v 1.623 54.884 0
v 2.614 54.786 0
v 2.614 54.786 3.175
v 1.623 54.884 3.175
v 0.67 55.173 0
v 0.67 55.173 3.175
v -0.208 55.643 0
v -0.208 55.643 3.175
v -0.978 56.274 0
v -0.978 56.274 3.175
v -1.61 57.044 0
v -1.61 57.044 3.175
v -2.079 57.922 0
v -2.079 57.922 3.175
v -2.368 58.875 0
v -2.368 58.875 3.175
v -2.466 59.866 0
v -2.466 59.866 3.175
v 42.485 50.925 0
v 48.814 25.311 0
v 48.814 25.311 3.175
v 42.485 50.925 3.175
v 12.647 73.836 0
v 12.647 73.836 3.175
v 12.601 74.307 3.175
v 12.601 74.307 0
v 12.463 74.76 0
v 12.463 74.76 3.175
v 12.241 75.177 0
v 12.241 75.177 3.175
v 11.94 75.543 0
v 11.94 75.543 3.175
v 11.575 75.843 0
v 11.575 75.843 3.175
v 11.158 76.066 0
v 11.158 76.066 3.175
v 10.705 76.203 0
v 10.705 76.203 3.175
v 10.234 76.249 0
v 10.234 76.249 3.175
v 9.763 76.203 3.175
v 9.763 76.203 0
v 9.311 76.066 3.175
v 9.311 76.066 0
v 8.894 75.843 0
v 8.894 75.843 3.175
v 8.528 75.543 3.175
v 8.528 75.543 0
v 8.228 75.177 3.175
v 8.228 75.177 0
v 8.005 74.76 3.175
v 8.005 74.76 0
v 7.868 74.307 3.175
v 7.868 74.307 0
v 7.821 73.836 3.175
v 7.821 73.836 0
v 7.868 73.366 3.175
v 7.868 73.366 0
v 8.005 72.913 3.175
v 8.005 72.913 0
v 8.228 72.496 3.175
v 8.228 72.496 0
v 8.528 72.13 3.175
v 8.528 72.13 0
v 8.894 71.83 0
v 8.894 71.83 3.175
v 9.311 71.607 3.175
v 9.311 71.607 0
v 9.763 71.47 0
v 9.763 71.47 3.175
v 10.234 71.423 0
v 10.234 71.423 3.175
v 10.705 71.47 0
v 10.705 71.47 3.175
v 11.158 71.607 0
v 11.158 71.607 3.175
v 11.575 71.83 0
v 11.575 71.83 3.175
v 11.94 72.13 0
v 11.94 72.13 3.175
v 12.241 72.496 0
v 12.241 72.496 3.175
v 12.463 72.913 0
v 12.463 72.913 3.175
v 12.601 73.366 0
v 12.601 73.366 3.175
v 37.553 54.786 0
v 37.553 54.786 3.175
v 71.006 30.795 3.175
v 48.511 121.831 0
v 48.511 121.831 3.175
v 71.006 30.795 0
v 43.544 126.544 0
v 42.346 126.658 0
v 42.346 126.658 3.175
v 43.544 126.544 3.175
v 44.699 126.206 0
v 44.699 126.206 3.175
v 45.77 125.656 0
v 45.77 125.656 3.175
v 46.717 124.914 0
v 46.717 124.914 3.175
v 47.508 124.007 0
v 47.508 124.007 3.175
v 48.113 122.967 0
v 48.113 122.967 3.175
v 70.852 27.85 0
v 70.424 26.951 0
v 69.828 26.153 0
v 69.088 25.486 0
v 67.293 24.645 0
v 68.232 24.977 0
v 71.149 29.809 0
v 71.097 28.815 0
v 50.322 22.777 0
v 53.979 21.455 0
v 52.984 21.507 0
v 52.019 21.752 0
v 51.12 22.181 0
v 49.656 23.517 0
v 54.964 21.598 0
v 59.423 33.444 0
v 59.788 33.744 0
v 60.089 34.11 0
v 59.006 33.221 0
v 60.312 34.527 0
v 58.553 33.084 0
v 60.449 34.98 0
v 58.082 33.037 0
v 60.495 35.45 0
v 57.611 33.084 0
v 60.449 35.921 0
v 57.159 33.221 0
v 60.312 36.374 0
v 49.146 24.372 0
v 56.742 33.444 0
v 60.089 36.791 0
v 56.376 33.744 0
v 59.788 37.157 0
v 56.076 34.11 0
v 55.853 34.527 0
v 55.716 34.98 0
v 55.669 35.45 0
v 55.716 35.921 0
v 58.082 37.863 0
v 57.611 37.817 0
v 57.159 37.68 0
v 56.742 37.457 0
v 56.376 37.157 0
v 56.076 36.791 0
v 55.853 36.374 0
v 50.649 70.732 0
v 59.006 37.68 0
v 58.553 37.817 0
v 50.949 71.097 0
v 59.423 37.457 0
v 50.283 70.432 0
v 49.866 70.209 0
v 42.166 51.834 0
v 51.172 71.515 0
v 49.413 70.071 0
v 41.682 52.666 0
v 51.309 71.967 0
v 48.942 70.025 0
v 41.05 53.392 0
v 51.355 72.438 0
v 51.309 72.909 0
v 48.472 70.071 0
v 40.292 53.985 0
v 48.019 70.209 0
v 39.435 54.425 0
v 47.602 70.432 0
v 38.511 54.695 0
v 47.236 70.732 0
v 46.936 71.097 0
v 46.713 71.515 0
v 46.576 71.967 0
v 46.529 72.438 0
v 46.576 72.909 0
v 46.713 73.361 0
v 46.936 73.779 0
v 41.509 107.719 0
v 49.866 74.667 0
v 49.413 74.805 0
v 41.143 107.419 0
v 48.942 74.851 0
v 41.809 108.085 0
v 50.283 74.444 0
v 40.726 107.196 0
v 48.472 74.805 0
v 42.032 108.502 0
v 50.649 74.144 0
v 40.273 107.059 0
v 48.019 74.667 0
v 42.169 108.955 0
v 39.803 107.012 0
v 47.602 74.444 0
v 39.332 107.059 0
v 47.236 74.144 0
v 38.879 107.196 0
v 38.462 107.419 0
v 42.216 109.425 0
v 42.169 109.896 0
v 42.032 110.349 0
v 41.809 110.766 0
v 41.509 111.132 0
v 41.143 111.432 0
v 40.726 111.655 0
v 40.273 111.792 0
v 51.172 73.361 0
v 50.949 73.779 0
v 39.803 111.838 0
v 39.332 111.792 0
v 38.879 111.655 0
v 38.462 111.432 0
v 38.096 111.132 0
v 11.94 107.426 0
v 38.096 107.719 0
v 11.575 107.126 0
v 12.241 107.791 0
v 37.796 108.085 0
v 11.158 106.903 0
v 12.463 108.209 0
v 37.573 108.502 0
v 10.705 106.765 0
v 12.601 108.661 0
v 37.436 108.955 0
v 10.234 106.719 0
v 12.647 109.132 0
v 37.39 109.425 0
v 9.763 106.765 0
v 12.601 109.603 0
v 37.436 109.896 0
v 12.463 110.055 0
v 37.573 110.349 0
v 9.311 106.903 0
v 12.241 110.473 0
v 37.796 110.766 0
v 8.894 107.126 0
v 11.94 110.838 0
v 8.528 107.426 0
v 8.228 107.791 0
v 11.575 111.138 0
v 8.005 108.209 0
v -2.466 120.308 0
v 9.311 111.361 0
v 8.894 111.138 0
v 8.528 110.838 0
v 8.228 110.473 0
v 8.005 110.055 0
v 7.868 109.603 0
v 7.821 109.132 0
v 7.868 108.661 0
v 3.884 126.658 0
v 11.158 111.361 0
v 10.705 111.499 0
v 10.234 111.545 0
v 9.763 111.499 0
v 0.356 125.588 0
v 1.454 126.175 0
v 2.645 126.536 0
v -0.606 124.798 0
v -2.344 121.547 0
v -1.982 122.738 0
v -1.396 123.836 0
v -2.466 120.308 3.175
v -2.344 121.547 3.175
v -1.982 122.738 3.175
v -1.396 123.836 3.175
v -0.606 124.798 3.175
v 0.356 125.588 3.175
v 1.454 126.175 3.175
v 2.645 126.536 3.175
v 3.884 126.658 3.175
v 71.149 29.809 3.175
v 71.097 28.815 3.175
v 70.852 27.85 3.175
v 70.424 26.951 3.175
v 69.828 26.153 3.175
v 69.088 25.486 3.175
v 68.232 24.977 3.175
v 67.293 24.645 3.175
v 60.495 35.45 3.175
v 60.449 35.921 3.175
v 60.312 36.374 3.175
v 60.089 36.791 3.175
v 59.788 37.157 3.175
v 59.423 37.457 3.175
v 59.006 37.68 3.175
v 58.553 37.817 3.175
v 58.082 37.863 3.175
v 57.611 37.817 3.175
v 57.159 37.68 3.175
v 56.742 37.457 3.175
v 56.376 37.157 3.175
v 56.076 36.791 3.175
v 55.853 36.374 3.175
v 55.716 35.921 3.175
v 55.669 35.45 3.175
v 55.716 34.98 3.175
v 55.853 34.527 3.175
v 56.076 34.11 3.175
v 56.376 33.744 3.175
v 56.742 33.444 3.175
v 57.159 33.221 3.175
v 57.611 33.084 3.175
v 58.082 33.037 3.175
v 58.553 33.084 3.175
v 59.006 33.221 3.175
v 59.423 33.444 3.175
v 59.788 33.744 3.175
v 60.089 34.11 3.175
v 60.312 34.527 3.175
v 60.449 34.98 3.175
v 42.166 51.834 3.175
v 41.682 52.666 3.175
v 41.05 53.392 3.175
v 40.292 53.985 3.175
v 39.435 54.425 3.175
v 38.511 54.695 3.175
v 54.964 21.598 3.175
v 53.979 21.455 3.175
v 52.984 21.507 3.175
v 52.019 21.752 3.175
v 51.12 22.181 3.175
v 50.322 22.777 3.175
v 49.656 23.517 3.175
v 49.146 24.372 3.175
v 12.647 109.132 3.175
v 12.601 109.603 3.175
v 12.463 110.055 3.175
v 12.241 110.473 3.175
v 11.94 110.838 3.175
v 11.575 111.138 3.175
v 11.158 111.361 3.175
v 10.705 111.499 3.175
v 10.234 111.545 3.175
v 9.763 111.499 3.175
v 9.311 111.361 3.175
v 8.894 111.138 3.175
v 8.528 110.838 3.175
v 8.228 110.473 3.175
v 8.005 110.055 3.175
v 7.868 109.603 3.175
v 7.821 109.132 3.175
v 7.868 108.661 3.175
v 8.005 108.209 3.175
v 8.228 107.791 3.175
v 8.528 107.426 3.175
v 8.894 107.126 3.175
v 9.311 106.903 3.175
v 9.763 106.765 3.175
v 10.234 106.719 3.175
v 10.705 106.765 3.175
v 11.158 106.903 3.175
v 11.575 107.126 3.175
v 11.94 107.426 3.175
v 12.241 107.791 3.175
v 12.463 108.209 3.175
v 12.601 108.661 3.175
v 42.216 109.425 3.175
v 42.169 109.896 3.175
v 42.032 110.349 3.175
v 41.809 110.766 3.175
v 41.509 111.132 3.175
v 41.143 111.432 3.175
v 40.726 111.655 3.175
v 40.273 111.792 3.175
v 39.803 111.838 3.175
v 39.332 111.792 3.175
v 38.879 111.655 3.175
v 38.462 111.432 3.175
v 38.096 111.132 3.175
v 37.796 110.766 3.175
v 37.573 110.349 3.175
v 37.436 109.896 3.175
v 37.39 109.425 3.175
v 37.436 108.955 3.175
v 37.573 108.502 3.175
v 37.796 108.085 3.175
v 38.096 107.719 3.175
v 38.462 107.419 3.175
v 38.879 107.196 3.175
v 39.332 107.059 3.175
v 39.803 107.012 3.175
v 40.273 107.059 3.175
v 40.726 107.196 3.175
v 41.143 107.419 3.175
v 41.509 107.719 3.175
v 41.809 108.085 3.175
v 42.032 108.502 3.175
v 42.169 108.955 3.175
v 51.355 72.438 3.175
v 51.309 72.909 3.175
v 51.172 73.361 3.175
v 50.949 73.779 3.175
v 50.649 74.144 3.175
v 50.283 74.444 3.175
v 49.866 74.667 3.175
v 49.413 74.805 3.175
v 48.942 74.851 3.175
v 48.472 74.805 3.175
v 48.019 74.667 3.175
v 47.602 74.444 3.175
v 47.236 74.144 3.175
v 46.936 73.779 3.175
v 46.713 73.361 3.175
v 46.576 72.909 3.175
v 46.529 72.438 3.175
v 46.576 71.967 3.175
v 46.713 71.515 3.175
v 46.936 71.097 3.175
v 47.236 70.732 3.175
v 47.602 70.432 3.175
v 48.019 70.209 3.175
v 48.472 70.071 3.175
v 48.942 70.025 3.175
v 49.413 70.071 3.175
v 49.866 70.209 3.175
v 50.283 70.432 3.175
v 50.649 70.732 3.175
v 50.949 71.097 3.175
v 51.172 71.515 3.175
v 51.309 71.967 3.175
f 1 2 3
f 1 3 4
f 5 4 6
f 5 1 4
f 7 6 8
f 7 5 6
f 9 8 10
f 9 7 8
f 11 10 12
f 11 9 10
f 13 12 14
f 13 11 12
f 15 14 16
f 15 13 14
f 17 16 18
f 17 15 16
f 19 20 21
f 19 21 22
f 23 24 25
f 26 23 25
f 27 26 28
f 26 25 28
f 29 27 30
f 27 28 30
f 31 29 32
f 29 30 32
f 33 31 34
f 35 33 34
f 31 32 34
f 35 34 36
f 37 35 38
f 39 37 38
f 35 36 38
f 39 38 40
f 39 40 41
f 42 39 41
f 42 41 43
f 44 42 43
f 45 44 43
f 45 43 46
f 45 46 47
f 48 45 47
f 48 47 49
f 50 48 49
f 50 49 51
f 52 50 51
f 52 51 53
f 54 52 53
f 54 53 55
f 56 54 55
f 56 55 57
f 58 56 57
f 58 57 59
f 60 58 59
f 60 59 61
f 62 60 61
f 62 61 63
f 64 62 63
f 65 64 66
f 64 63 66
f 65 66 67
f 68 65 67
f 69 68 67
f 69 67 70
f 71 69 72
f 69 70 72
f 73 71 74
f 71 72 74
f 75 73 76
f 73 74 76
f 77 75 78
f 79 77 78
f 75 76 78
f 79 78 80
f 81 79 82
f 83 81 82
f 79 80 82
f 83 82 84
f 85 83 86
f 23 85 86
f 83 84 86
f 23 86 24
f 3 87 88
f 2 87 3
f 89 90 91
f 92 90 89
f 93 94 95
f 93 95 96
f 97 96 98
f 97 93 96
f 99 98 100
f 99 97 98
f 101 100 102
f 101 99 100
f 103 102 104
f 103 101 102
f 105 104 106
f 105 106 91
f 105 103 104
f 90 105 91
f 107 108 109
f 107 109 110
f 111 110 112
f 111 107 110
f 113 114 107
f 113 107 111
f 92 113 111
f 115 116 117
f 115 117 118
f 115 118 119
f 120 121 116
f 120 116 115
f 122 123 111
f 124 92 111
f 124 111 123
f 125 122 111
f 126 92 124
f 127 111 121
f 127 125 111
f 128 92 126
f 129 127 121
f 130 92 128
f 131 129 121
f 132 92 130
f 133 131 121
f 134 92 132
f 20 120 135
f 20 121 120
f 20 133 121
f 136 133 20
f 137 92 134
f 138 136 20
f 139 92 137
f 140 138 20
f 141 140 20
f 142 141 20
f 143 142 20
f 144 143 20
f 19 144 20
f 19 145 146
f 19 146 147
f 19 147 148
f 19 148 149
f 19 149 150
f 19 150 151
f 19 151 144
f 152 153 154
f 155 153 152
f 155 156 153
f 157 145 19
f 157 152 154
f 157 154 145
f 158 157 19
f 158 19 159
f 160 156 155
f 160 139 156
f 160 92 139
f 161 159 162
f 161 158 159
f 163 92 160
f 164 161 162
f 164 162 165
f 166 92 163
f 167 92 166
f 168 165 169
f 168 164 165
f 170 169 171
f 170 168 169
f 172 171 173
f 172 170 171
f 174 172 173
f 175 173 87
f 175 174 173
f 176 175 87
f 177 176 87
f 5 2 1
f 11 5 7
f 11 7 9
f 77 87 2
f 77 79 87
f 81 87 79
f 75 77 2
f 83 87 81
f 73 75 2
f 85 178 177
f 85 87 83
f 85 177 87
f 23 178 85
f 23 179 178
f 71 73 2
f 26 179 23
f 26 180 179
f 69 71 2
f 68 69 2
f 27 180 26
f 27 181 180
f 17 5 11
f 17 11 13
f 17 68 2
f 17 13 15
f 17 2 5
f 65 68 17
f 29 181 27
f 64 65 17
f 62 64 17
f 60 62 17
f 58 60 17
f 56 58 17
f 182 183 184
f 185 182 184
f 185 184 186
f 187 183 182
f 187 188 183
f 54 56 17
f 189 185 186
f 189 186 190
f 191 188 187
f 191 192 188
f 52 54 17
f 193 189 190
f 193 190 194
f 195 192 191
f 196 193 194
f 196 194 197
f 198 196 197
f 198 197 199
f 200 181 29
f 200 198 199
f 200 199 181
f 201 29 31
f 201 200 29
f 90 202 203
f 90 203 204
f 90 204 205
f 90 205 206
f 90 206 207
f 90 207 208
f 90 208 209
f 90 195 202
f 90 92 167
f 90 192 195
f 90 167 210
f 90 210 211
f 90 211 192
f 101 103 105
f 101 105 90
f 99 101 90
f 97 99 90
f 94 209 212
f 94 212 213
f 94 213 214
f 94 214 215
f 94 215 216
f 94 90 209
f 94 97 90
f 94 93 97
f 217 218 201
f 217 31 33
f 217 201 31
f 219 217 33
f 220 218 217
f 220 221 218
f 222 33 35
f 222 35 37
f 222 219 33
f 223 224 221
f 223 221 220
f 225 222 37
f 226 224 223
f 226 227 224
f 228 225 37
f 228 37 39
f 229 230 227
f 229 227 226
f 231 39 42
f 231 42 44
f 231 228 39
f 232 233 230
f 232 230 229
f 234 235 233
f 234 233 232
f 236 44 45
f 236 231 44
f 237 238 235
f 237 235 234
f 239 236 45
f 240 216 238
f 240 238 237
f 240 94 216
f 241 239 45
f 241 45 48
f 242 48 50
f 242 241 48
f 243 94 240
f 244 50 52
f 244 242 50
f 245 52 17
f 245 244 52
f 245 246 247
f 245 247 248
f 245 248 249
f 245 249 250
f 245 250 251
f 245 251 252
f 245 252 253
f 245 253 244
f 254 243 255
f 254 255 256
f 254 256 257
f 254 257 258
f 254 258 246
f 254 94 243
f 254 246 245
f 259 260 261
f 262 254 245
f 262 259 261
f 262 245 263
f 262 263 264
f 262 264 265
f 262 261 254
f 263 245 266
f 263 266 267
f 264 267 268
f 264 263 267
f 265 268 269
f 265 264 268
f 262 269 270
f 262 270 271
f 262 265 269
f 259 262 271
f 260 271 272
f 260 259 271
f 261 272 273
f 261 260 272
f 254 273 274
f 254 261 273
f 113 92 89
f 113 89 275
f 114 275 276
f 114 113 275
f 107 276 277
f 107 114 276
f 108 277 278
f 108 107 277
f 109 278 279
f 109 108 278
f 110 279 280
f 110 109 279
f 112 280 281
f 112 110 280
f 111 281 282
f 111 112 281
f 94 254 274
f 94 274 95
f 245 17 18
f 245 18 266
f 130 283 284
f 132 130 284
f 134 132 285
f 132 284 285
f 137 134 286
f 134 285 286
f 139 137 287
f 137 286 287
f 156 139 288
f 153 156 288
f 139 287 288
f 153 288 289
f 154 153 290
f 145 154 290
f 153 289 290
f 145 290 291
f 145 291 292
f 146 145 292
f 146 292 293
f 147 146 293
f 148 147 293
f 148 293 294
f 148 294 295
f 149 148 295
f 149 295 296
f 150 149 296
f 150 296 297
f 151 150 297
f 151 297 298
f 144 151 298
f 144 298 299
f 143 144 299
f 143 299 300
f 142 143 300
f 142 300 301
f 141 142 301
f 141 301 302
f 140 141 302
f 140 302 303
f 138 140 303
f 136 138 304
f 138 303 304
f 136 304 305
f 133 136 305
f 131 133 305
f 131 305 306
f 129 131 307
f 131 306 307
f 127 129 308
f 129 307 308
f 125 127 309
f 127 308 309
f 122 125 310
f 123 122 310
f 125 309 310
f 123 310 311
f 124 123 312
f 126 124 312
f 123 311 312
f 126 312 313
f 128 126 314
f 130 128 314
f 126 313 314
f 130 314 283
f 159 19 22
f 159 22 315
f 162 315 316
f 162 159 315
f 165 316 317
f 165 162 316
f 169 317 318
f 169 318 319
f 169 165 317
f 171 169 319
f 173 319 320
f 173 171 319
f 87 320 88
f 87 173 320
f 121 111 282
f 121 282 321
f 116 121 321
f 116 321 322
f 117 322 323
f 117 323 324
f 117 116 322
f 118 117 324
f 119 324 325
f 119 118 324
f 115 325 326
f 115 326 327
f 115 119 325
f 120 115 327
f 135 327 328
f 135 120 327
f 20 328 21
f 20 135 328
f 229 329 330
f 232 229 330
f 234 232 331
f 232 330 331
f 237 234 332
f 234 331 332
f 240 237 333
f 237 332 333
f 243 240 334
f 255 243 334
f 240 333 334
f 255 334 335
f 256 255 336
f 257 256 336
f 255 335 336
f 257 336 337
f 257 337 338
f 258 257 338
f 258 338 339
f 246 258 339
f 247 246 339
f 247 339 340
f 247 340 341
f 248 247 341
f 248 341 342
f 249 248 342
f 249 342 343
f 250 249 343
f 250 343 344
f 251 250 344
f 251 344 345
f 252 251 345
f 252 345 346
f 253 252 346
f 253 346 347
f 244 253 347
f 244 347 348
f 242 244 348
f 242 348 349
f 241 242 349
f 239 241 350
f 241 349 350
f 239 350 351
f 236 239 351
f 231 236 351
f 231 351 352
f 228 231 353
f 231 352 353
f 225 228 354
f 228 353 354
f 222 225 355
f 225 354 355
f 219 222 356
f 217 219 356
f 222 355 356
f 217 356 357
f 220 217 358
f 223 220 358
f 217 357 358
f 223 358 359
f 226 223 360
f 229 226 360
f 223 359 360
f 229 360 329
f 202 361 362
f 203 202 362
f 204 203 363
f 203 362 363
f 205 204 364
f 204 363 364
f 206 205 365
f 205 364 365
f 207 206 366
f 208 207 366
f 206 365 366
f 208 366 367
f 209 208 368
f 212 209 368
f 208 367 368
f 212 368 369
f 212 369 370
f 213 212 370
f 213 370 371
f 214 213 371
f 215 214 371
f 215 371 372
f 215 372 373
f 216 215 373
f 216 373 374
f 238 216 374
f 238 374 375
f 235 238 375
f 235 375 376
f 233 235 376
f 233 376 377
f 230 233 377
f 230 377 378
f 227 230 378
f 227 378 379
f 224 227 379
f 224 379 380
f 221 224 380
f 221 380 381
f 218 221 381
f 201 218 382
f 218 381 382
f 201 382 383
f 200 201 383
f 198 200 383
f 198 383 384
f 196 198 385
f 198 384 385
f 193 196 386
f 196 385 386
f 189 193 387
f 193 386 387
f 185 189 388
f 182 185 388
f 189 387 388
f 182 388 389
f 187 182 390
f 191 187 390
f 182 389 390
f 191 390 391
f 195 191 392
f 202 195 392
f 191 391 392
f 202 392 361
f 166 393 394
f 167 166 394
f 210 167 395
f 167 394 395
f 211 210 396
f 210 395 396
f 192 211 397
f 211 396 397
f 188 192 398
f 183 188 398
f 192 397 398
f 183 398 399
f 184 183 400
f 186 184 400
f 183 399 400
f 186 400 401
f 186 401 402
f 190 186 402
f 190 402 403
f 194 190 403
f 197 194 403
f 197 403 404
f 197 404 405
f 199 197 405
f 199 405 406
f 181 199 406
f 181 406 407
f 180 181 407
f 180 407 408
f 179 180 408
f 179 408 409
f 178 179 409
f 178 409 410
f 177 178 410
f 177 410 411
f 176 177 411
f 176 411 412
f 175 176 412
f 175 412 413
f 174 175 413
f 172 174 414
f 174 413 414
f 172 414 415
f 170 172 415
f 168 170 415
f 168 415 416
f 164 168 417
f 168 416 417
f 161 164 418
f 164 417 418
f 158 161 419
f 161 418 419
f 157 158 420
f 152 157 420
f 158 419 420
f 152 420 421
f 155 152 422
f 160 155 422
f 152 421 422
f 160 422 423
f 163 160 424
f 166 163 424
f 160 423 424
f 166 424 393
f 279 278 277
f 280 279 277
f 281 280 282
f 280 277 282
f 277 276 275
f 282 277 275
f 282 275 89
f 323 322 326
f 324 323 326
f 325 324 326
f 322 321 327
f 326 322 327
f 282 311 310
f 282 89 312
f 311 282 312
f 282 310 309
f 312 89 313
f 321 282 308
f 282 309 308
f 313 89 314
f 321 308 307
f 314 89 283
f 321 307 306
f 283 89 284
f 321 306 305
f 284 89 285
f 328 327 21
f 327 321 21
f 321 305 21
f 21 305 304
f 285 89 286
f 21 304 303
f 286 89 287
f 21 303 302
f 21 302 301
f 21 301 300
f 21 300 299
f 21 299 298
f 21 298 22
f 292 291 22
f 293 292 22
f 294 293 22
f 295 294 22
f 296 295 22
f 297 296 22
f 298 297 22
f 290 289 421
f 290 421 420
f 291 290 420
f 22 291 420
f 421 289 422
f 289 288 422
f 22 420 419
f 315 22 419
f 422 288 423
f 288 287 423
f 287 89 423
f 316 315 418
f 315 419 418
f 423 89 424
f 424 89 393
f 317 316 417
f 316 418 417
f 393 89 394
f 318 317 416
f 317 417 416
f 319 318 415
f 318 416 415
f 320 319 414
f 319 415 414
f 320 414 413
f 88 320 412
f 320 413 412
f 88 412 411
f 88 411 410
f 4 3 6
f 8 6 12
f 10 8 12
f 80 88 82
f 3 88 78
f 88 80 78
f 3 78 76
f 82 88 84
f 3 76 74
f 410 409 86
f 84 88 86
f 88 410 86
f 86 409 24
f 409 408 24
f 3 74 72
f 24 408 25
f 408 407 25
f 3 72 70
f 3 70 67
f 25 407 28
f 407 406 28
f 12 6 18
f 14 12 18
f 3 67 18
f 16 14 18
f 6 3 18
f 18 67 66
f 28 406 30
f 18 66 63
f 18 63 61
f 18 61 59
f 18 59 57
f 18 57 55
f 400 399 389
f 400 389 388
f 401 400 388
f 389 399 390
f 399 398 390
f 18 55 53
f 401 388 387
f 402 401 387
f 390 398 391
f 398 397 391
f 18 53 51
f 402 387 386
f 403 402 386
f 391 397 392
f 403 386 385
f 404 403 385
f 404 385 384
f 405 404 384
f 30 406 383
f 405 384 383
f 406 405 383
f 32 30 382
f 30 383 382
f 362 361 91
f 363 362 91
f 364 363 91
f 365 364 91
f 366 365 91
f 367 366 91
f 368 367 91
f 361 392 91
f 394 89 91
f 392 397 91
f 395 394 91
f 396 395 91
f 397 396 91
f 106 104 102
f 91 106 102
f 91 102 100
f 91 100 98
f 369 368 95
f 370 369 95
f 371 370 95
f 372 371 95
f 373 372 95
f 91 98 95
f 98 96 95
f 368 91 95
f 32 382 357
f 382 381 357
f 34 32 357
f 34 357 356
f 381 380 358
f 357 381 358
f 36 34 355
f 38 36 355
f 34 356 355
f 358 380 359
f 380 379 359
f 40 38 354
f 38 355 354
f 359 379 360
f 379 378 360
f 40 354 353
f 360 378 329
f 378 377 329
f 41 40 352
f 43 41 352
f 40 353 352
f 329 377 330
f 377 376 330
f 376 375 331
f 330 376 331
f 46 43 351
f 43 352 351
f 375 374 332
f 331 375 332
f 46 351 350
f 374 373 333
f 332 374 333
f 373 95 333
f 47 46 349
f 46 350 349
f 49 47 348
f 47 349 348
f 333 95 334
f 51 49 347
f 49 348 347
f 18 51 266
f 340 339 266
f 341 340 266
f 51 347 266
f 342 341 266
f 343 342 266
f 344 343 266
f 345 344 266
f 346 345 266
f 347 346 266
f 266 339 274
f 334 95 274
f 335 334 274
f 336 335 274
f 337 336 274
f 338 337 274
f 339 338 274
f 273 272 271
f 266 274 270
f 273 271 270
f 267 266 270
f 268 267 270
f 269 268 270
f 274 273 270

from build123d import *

# Parameters (mm, degrees)
BOSS_EXTRUDE1_DEPTH = 3.175
SKETCH2_R           = 2.413
CUT_EXTRUDE1_DEPTH  = 146.311171514


with BuildPart() as part:
    # Sketch1 → Boss-Extrude1 (new body)
    with BuildSketch(Plane.XY):
        with BuildLine():
            Line((48.510867826, 121.831346212), (71.00638654, 30.794912365))
            ThreePointArc((71.00638654, 30.794912365), (70.423641708, 26.950767781), (67.293358183, 24.6446099))
            Line((67.293358183, 24.6446099), (54.964194654, 21.598017264))
            ThreePointArc((54.964194654, 21.598017264), (51.12005007, 22.180762096), (48.813892189, 25.311045622))
            Line((48.813892189, 25.311045622), (42.484535319, 50.925128378))
            ThreePointArc((42.484535319, 50.925128378), (40.684620517, 53.706308584), (37.552869907, 54.786491324))
            Line((37.552869907, 54.786491324), (2.614167294, 54.786491324))
            ThreePointArc((2.614167294, 54.786491324), (-0.977935154, 56.274388875), (-2.465832706, 59.866491324))
            Line((-2.465832706, 59.866491324), (-2.465832706, 120.308049894))
            ThreePointArc((-2.465832706, 120.308049894), (-0.605960766, 124.798177955), (3.884167294, 126.658049894))
            Line((3.884167294, 126.658049894), (42.346286061, 126.658049894))
            ThreePointArc((42.346286061, 126.658049894), (46.260974324, 125.30782147), (48.510867826, 121.831346212))
        make_face()
    extrude(amount=BOSS_EXTRUDE1_DEPTH)

    # Sketch2 → Cut-Extrude1 (cut, through all)
    with BuildSketch(Plane.XY.offset(3.175)):
        with Locations((58.082183783, 35.450477111)):
            Circle(SKETCH2_R)
        with Locations((48.942405878, 72.437967696)):
            Circle(SKETCH2_R)
        with Locations((39.802627972, 109.425458282)):
            Circle(SKETCH2_R)
        with Locations((10.234167294, 109.132049894)):
            Circle(SKETCH2_R)
        with Locations((10.234167294, 73.836491324)):
            Circle(SKETCH2_R)
    extrude(amount=-CUT_EXTRUDE1_DEPTH, mode=Mode.SUBTRACT)


solid = part.part
